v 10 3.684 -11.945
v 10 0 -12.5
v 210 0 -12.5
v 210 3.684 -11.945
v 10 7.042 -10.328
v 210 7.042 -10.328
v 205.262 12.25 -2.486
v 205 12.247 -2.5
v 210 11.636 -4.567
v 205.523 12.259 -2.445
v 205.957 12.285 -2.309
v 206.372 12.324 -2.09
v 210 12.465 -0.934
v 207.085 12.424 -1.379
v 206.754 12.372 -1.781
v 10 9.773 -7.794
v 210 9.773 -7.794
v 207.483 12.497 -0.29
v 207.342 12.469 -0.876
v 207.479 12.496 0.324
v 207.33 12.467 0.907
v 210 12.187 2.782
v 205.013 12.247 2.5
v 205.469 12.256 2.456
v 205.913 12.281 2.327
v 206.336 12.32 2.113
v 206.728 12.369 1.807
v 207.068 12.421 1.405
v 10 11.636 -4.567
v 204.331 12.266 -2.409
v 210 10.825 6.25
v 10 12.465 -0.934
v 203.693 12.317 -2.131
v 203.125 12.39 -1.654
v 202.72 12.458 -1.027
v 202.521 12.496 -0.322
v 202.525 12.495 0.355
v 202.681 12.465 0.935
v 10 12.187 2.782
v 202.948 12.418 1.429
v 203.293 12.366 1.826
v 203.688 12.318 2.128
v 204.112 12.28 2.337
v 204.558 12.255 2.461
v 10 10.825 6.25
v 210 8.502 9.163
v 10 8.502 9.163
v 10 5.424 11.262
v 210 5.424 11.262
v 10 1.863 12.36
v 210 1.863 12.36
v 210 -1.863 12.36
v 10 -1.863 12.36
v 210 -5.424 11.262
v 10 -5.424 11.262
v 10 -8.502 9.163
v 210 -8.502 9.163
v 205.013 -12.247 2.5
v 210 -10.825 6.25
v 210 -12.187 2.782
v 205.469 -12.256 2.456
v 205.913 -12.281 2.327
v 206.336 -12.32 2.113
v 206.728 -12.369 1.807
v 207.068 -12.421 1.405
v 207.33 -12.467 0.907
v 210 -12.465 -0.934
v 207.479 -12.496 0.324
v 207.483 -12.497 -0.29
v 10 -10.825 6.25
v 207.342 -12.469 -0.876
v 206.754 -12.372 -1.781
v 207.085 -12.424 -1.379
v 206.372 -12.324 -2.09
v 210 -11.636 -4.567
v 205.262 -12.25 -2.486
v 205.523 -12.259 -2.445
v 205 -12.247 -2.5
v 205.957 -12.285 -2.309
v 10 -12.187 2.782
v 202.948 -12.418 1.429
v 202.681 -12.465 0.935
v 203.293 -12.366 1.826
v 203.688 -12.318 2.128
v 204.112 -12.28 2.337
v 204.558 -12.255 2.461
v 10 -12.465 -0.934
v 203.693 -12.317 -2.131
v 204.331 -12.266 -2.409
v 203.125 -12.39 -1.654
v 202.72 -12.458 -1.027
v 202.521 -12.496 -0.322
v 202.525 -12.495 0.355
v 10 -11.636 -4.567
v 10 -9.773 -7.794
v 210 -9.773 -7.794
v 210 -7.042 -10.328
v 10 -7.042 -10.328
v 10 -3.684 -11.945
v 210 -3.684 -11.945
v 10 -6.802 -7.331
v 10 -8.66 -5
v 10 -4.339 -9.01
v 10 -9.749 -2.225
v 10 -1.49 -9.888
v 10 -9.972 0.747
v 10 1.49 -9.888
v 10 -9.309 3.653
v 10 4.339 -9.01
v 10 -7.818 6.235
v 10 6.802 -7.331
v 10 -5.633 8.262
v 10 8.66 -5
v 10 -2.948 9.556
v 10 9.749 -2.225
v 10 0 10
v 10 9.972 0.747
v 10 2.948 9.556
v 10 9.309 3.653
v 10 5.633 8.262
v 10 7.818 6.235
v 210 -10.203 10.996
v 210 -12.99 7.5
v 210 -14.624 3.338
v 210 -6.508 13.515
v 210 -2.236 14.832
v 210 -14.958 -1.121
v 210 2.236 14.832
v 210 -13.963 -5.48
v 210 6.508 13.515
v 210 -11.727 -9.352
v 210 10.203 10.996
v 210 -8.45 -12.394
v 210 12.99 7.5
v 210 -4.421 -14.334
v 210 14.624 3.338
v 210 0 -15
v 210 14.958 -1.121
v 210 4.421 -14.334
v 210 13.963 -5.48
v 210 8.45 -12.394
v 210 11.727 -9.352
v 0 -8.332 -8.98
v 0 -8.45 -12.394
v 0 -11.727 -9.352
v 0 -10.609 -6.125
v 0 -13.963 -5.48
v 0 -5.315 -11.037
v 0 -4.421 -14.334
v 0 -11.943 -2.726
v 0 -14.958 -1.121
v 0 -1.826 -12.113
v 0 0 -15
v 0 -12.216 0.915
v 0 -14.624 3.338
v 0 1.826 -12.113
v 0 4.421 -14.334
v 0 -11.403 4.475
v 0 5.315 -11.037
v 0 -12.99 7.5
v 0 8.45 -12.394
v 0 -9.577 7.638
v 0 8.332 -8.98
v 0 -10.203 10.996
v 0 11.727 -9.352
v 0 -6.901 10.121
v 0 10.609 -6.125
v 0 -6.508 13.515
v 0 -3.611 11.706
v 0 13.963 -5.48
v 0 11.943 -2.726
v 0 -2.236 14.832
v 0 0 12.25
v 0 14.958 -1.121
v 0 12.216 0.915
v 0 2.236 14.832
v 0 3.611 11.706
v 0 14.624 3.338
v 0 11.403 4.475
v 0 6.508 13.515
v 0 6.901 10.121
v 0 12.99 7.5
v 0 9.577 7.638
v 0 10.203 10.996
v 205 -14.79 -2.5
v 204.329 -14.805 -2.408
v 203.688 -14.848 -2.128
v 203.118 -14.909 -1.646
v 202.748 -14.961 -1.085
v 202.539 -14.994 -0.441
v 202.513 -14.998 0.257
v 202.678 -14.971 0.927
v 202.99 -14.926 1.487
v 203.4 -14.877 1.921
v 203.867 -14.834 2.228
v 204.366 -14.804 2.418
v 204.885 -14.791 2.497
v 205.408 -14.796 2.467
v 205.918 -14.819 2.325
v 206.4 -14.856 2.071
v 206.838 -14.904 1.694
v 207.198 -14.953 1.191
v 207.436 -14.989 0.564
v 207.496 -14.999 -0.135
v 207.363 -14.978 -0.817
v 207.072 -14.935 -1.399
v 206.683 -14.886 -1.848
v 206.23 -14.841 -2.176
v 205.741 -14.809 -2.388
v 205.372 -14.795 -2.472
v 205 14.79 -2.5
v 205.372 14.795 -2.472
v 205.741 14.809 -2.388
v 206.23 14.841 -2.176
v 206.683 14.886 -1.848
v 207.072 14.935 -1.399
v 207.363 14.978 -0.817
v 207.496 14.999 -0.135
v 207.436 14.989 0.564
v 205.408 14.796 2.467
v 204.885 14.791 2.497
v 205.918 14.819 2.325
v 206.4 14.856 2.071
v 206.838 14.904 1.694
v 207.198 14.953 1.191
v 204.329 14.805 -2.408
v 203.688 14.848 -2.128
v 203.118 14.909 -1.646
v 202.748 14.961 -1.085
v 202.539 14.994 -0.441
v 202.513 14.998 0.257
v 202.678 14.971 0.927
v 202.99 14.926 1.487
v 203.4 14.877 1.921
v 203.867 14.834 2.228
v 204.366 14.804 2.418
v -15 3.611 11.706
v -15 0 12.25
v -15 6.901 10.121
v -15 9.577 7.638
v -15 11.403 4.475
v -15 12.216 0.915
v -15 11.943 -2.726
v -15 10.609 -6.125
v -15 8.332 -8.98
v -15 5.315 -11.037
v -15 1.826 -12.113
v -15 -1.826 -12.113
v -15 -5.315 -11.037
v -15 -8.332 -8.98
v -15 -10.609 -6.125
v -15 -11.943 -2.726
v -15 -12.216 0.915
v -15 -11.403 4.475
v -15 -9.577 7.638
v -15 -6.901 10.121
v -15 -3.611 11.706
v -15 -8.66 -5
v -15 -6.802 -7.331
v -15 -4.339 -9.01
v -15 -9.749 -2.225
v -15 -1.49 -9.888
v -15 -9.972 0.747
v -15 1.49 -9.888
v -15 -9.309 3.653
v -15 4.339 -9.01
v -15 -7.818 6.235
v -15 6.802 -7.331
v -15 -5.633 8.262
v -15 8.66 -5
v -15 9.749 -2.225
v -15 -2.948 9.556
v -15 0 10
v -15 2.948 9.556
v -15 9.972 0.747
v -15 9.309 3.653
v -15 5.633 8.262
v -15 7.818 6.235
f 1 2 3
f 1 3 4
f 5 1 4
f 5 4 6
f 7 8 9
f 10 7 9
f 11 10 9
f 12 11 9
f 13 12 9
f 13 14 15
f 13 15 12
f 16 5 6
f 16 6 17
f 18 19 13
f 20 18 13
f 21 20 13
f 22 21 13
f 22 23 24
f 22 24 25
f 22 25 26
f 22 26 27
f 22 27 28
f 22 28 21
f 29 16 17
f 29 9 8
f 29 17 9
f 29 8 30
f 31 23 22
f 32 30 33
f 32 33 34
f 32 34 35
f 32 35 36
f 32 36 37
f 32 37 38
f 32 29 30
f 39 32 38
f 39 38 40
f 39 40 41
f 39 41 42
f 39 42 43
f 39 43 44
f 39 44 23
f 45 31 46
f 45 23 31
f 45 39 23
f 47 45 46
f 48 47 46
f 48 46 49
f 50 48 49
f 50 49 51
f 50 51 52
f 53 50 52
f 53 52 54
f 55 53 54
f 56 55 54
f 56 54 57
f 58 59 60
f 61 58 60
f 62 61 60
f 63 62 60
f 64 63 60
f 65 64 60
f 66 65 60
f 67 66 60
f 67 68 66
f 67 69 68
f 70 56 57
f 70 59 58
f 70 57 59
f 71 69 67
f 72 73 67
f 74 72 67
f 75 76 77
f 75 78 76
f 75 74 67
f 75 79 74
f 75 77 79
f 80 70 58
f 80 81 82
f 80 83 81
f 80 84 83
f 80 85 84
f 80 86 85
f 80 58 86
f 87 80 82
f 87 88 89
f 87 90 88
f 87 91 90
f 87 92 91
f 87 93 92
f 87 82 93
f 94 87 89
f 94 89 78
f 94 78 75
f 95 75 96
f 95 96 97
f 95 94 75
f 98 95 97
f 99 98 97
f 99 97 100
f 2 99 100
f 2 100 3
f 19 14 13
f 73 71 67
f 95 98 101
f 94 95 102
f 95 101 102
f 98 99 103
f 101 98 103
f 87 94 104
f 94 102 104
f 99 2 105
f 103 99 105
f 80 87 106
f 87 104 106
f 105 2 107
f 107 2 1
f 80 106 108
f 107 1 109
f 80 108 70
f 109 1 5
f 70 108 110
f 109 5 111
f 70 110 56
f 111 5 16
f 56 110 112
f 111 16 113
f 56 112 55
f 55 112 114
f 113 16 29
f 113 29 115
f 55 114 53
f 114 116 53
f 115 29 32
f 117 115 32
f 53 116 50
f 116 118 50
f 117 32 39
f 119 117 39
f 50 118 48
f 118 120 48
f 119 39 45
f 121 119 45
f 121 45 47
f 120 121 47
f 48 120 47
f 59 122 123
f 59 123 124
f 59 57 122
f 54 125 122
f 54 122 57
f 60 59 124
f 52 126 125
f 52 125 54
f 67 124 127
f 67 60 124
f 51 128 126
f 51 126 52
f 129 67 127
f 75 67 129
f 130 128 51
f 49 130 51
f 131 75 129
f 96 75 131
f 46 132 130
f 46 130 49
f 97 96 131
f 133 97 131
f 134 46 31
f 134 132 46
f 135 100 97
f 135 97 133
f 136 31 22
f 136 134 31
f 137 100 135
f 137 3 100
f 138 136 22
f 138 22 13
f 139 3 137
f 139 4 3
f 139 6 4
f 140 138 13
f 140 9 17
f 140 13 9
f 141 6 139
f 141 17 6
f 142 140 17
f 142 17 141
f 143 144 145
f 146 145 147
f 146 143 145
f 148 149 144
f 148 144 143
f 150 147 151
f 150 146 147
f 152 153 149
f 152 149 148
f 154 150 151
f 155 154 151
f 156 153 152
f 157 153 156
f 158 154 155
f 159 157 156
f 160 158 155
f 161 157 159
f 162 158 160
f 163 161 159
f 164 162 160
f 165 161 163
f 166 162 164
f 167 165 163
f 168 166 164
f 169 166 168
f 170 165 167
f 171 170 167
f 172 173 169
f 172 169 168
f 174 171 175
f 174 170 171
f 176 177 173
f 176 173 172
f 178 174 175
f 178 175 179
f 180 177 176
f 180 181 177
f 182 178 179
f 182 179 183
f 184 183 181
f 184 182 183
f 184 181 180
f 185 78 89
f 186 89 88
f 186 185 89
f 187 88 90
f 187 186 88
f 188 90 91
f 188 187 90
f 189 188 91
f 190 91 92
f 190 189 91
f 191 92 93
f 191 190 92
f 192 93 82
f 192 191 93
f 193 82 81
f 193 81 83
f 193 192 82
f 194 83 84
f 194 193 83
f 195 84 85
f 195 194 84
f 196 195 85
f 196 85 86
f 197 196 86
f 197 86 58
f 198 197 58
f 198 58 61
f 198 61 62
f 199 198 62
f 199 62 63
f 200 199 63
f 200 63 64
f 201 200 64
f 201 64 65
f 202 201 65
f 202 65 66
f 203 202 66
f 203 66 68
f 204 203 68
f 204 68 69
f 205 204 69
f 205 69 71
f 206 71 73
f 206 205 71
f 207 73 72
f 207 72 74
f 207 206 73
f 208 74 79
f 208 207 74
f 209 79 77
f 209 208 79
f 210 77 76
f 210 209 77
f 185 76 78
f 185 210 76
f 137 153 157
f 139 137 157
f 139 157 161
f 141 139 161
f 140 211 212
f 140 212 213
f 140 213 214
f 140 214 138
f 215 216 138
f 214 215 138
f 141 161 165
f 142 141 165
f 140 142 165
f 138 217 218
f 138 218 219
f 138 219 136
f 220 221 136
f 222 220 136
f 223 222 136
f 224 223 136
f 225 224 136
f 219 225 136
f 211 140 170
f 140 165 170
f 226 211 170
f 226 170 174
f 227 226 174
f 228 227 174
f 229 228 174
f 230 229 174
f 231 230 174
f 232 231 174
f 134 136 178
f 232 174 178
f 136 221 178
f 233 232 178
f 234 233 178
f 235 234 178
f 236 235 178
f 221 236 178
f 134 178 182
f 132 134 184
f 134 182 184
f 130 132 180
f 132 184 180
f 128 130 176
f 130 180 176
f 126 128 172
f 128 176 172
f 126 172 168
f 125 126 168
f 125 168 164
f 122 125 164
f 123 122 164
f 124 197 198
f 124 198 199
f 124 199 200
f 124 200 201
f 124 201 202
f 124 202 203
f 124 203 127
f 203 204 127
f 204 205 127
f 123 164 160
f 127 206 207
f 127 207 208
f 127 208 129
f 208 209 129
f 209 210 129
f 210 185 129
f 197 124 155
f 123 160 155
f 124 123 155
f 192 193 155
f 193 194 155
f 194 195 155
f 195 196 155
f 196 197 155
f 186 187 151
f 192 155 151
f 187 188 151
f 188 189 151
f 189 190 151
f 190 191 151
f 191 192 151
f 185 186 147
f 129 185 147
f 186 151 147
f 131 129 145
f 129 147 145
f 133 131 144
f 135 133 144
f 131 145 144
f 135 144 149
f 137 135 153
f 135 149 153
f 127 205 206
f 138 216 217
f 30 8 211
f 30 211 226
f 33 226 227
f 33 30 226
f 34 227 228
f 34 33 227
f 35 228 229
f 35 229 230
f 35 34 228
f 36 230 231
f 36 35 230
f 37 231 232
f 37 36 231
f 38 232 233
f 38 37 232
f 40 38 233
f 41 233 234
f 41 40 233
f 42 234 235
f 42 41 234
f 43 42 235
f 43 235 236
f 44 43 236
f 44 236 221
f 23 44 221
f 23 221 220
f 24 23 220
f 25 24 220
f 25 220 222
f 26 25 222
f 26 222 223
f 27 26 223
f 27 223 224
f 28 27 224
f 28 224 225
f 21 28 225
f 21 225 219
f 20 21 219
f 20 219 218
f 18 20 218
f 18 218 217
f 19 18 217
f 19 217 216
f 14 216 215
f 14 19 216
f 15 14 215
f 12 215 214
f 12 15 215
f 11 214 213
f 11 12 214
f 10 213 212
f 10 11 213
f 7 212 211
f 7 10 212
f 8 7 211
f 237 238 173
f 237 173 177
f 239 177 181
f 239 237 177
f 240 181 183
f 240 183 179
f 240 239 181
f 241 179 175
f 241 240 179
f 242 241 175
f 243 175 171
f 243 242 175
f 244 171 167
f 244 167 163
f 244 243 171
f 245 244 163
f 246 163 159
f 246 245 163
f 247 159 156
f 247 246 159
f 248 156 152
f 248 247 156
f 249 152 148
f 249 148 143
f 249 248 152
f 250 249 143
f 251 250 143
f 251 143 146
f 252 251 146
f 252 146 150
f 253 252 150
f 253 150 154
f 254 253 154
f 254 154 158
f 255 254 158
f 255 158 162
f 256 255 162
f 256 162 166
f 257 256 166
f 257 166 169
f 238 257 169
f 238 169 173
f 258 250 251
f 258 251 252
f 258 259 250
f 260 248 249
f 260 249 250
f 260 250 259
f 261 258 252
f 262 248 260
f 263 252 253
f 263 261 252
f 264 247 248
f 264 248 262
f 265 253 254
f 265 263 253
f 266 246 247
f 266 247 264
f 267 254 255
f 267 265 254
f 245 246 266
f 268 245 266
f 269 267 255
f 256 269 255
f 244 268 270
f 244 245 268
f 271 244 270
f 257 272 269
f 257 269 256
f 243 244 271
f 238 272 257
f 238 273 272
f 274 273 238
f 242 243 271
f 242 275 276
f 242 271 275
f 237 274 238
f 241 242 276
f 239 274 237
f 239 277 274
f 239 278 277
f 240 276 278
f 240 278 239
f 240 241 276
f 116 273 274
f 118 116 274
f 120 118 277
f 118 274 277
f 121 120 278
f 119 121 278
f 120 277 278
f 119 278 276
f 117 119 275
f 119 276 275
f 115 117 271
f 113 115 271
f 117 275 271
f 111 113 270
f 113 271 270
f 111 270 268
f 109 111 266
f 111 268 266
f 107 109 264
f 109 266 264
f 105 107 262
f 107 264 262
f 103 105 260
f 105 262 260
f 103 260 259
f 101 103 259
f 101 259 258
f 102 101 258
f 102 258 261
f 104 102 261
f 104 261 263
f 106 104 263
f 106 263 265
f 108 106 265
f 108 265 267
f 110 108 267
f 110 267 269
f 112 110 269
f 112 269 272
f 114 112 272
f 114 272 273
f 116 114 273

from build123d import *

# Parameters (mm, degrees)
ESBO_O1_R                  = 15
ESBO_O1_R_2                = 12.5
RESSALTO_EXTRUS_O1_DEPTH   = 210
RESSALTO_EXTRUS_O3_START   = 15
ESBO_O2_R                  = 12.25
ESBO_O2_R_2                = 10
RESSALTO_EXTRUS_O3_DEPTH   = 20
CORTE_EXTRUS_O2_DEPTH      = 300
CORTE_EXTRUS_O2_DEPTH_BACK = 300
ESBO_O4_R                  = 2.5
ESBO_O9_R                  = 12.5
RESSALTO_EXTRUS_O5_DEPTH   = 10
ESBO_O10_R                 = 10
CORTE_EXTRUS_O5_DEPTH      = 20


with BuildPart() as part:
    # Esboço1 → Ressalto-extrusão1 (new body)
    with BuildSketch(Plane(origin=(0, 0, 0), x_dir=(0, 0, -1), z_dir=(1, 0, 0))):
        Circle(ESBO_O1_R)
        Circle(ESBO_O1_R_2, mode=Mode.SUBTRACT)
    extrude(amount=RESSALTO_EXTRUS_O1_DEPTH)

    # Esboço4 → Corte-extrusão2 (cut, two sides: drawn at the far end of the back side and taken through both)
    with BuildSketch(Plane(origin=(0, 0, 0), x_dir=(1, 0, 0), z_dir=(0, 1, 0)).offset(-CORTE_EXTRUS_O2_DEPTH_BACK)):
        with Locations((205, 0)):
            Circle(ESBO_O4_R)
    extrude(amount=CORTE_EXTRUS_O2_DEPTH + CORTE_EXTRUS_O2_DEPTH_BACK, mode=Mode.SUBTRACT)



with BuildPart() as body_2:
    # Esboço2 → Ressalto-extrusão3 (new body)
    with BuildSketch(Plane.ZY.offset(RESSALTO_EXTRUS_O3_START)):
        Circle(ESBO_O2_R)
        Circle(ESBO_O2_R_2, mode=Mode.SUBTRACT)
    extrude(amount=-RESSALTO_EXTRUS_O3_DEPTH)


with BuildPart() as part_1:
    add(part.part)

    add(body_2.part)  # Ressalto-extrusão5 merges body 2
    # Esboço9 → Ressalto-extrusão5 (add)
    with BuildSketch(Plane.ZY):
        Circle(ESBO_O9_R)
    extrude(amount=-RESSALTO_EXTRUS_O5_DEPTH)

    # Esboço10 → Corte-extrusão5 (cut)
    with BuildSketch(Plane.ZY):
        Circle(ESBO_O10_R)
    extrude(amount=-CORTE_EXTRUS_O5_DEPTH, mode=Mode.SUBTRACT)


solid = part_1.part
